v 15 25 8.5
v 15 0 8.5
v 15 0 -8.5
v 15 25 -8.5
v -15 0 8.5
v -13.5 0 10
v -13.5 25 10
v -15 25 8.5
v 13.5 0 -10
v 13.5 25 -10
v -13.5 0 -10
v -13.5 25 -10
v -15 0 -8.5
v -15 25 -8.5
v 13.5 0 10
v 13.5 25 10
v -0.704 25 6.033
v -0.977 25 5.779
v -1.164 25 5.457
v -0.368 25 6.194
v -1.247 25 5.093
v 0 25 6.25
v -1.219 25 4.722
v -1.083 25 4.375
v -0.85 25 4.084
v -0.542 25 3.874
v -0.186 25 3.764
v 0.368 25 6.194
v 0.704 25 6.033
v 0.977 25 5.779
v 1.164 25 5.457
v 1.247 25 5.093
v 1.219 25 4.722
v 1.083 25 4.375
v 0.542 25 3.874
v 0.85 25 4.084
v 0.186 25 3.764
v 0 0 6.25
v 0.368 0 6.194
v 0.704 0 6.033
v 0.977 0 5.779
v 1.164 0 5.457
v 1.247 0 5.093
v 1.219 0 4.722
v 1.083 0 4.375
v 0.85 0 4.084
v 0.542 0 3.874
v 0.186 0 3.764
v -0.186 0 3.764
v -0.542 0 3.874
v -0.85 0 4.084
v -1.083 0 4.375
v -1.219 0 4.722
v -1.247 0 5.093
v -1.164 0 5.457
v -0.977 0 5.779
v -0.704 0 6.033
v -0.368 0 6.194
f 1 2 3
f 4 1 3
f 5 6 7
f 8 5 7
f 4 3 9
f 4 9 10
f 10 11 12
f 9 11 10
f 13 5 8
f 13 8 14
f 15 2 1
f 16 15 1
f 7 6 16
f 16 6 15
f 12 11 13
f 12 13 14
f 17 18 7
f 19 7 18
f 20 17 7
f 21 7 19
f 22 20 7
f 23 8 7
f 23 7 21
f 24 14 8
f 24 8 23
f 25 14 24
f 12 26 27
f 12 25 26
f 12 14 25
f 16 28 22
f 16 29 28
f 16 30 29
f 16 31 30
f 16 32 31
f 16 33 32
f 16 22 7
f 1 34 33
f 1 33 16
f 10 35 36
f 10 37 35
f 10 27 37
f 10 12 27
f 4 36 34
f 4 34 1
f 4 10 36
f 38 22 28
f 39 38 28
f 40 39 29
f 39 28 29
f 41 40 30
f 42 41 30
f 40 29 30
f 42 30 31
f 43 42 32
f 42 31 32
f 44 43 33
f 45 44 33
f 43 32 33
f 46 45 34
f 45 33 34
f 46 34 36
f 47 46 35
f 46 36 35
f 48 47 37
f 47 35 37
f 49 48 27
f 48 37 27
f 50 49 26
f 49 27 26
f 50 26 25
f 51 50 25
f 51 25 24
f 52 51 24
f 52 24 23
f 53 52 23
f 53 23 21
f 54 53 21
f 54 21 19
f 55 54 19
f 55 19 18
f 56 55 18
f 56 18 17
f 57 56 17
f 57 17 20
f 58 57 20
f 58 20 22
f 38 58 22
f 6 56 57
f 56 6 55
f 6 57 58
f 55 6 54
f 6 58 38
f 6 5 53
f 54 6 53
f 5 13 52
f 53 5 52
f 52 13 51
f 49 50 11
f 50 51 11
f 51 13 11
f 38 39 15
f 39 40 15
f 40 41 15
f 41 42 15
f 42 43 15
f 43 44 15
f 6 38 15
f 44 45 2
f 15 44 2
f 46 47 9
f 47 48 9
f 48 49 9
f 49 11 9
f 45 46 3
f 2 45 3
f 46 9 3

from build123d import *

# Parameters (mm, degrees)
SKETCH_1_W          = 30
SKETCH_1_H          = 20
EXTRUDE_1_DEPTH     = 25
SKETCH_2_R          = 1.25
CUT_EXTRUDE_1_DEPTH = 31.822070015
CHAMFER_1_SIZE      = 1.5


with BuildPart() as part:
    # 草图1 → 凸台-拉伸1 (new body)
    with BuildSketch(Plane(origin=(0, 0, 0), x_dir=(1, 0, 0), z_dir=(0, 1, 0))):
        Rectangle(SKETCH_1_W, SKETCH_1_H)
    extrude(amount=EXTRUDE_1_DEPTH)

    # 草图2 → 切除-拉伸1 (cut, through all)
    with BuildSketch(Plane(origin=(0, 25, 0), x_dir=(1, 0, 0), z_dir=(0, 1, 0))):
        with Locations(Location((0, -5, 0), (0, 0, 270))):
            Circle(SKETCH_2_R)
    extrude(amount=-CUT_EXTRUDE_1_DEPTH, mode=Mode.SUBTRACT)

    # 倒角1
    chamfer_1_edges = [part.edges().sort_by_distance(p)[0] for p in [
        (-15, 12.5, -10),
        (15, 12.5, -10),
        (15, 12.5, 10),
        (-15, 12.5, 10),
    ]]
    chamfer(chamfer_1_edges, length=CHAMFER_1_SIZE)


solid = part.part
